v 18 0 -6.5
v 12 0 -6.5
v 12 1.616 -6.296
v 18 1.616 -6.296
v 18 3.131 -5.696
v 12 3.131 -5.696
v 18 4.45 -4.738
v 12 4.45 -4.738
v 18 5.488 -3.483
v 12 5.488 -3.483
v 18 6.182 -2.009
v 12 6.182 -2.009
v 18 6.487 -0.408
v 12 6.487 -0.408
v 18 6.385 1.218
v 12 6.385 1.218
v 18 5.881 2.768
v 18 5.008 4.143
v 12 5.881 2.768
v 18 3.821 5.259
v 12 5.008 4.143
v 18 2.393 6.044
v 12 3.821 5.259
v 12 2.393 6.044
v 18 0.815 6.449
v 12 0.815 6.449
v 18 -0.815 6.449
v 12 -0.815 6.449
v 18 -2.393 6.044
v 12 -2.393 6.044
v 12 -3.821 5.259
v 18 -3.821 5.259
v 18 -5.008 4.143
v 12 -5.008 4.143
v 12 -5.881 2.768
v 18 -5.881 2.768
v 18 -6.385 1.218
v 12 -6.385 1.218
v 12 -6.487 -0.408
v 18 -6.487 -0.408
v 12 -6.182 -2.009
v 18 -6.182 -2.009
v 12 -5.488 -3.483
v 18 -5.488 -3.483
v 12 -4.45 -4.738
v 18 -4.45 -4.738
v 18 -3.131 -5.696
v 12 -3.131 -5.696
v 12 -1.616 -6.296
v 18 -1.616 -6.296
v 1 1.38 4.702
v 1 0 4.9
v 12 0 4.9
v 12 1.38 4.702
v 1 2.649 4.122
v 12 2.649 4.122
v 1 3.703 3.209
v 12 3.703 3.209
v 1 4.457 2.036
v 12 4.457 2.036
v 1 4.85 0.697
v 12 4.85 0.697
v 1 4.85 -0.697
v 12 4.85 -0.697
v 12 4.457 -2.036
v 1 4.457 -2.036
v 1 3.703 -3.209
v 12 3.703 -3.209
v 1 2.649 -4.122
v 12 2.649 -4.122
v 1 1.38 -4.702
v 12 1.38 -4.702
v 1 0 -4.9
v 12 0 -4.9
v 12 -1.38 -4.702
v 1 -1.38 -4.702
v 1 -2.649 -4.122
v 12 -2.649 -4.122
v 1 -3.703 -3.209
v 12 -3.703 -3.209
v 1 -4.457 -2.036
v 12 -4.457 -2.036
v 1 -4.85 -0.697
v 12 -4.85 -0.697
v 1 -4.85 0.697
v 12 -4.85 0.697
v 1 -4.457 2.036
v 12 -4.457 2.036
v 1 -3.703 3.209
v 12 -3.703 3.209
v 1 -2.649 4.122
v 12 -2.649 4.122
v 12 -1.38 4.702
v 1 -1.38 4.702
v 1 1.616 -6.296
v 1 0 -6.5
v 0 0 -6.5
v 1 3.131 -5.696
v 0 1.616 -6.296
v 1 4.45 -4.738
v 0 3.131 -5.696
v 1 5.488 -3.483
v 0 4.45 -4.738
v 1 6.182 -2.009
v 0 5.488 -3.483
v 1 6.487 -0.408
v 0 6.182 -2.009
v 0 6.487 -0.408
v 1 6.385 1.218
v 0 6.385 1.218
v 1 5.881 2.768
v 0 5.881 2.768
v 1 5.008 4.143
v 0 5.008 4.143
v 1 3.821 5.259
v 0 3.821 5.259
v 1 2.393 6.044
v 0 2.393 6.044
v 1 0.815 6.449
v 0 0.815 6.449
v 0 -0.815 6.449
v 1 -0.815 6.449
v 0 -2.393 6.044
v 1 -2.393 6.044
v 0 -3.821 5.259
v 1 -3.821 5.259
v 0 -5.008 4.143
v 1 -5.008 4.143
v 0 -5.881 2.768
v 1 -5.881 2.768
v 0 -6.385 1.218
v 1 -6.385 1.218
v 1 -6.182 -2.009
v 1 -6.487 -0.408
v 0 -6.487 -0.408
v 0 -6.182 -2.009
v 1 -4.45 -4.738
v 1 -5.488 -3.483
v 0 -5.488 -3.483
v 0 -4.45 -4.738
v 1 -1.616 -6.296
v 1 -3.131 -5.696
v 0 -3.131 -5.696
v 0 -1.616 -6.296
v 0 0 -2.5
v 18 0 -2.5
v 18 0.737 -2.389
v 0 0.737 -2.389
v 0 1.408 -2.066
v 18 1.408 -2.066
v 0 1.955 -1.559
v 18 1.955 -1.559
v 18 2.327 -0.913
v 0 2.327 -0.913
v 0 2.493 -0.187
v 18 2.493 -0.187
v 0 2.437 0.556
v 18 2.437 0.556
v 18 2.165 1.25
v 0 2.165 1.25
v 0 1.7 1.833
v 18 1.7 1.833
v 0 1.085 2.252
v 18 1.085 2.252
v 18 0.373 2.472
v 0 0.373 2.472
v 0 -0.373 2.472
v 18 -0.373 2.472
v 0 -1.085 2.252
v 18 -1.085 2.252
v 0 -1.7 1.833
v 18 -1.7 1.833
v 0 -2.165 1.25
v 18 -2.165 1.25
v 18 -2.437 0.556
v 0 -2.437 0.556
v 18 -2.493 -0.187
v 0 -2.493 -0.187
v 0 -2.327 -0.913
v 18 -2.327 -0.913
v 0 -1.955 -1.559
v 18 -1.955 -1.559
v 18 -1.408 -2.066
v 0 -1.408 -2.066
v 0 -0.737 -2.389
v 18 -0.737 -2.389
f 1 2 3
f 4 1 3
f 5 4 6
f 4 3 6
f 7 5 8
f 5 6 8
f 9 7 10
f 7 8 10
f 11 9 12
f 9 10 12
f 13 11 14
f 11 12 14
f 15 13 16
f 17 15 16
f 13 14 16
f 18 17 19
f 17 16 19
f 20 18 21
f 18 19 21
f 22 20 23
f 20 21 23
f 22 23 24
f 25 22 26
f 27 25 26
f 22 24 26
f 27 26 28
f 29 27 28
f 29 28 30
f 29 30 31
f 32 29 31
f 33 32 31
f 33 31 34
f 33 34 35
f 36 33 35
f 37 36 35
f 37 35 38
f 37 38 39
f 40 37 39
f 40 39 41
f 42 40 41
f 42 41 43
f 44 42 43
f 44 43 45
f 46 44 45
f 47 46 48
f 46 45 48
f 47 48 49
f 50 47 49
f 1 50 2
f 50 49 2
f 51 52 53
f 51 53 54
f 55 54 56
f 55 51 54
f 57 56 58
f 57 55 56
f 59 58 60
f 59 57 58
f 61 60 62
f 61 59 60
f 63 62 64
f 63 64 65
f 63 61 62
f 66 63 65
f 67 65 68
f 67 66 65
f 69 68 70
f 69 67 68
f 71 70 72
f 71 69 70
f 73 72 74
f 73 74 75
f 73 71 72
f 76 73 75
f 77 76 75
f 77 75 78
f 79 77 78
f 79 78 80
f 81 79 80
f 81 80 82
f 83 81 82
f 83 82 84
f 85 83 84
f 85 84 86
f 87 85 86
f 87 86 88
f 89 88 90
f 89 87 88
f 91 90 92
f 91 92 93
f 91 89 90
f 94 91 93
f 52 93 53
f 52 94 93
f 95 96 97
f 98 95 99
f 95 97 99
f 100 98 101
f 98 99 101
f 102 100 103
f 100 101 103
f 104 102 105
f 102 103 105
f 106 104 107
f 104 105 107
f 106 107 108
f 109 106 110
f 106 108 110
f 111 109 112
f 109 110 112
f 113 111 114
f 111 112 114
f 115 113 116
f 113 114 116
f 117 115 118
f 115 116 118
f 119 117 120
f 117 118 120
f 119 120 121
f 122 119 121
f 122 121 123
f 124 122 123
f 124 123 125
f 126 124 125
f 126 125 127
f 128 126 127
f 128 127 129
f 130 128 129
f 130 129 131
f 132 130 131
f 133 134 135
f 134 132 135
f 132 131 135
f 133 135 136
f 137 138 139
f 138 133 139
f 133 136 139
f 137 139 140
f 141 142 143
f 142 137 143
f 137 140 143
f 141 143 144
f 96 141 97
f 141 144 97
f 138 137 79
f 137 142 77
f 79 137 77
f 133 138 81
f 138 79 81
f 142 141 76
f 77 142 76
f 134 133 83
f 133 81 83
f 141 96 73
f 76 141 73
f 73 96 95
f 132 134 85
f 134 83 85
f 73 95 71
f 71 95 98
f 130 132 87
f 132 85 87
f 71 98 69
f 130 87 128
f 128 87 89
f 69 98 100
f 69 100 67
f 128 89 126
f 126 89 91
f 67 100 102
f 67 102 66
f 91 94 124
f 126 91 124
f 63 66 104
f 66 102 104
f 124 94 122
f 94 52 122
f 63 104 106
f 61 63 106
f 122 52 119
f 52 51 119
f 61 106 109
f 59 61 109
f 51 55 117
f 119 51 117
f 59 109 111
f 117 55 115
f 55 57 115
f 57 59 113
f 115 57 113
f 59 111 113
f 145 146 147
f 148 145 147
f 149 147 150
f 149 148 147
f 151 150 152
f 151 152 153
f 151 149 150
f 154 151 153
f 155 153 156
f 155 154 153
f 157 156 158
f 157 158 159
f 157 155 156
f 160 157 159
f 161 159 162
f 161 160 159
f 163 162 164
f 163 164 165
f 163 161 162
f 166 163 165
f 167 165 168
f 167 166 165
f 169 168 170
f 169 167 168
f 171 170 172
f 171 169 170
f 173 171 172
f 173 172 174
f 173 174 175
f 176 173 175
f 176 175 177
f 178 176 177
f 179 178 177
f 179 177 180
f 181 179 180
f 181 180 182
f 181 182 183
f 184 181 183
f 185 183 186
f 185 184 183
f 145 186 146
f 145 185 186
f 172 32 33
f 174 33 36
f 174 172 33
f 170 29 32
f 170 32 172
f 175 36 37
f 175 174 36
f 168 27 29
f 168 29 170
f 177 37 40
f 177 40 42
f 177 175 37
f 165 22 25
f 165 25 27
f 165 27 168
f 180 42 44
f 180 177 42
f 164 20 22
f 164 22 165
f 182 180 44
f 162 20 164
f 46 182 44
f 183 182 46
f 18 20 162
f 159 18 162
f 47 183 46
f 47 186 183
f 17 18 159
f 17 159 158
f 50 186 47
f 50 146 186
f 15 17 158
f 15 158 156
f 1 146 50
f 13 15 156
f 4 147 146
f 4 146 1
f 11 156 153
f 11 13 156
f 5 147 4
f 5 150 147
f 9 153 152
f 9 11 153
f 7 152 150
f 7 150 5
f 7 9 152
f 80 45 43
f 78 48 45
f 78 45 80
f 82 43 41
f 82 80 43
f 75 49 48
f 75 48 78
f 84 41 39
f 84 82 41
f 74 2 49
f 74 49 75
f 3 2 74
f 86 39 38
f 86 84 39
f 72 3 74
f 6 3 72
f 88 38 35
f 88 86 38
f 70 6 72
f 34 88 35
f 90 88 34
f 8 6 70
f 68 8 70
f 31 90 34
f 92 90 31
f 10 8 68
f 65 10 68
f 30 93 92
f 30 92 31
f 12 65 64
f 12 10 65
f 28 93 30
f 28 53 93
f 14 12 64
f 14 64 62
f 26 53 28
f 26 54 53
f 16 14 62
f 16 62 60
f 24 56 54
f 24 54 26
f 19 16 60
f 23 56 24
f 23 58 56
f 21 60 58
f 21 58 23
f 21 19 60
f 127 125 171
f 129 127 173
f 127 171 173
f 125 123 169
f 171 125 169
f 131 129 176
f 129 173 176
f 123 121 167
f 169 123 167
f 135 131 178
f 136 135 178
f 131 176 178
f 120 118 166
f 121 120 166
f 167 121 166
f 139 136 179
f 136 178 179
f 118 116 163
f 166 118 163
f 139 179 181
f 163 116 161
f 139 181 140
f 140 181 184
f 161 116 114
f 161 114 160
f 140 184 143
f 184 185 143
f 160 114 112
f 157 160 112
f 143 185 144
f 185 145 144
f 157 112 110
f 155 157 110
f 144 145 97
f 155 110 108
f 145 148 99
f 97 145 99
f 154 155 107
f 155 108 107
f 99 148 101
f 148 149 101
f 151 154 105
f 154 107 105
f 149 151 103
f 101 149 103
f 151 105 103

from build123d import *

# Parameters (mm, degrees)
SKETCH1_R           = 6.5
SKETCH1_R_2         = 2.5
BOSS_EXTRUDE1_DEPTH = 18
SKETCH2_R           = 6.5
SKETCH2_R_2         = 4.9
CUT_EXTRUDE1_DEPTH  = 11


with BuildPart() as part:
    # Sketch1 → Boss-Extrude1 (new body)
    with BuildSketch(Plane(origin=(0, 0, 0), x_dir=(0, 0, -1), z_dir=(1, 0, 0))):
        Circle(SKETCH1_R)
        Circle(SKETCH1_R_2, mode=Mode.SUBTRACT)
    extrude(amount=BOSS_EXTRUDE1_DEPTH)

    # Sketch2 → Cut-Extrude1 (cut)
    with BuildSketch(Plane.ZY.offset(-1)):
        Circle(SKETCH2_R)
        Circle(SKETCH2_R_2, mode=Mode.SUBTRACT)
    extrude(amount=-CUT_EXTRUDE1_DEPTH, mode=Mode.SUBTRACT)


solid = part.part
